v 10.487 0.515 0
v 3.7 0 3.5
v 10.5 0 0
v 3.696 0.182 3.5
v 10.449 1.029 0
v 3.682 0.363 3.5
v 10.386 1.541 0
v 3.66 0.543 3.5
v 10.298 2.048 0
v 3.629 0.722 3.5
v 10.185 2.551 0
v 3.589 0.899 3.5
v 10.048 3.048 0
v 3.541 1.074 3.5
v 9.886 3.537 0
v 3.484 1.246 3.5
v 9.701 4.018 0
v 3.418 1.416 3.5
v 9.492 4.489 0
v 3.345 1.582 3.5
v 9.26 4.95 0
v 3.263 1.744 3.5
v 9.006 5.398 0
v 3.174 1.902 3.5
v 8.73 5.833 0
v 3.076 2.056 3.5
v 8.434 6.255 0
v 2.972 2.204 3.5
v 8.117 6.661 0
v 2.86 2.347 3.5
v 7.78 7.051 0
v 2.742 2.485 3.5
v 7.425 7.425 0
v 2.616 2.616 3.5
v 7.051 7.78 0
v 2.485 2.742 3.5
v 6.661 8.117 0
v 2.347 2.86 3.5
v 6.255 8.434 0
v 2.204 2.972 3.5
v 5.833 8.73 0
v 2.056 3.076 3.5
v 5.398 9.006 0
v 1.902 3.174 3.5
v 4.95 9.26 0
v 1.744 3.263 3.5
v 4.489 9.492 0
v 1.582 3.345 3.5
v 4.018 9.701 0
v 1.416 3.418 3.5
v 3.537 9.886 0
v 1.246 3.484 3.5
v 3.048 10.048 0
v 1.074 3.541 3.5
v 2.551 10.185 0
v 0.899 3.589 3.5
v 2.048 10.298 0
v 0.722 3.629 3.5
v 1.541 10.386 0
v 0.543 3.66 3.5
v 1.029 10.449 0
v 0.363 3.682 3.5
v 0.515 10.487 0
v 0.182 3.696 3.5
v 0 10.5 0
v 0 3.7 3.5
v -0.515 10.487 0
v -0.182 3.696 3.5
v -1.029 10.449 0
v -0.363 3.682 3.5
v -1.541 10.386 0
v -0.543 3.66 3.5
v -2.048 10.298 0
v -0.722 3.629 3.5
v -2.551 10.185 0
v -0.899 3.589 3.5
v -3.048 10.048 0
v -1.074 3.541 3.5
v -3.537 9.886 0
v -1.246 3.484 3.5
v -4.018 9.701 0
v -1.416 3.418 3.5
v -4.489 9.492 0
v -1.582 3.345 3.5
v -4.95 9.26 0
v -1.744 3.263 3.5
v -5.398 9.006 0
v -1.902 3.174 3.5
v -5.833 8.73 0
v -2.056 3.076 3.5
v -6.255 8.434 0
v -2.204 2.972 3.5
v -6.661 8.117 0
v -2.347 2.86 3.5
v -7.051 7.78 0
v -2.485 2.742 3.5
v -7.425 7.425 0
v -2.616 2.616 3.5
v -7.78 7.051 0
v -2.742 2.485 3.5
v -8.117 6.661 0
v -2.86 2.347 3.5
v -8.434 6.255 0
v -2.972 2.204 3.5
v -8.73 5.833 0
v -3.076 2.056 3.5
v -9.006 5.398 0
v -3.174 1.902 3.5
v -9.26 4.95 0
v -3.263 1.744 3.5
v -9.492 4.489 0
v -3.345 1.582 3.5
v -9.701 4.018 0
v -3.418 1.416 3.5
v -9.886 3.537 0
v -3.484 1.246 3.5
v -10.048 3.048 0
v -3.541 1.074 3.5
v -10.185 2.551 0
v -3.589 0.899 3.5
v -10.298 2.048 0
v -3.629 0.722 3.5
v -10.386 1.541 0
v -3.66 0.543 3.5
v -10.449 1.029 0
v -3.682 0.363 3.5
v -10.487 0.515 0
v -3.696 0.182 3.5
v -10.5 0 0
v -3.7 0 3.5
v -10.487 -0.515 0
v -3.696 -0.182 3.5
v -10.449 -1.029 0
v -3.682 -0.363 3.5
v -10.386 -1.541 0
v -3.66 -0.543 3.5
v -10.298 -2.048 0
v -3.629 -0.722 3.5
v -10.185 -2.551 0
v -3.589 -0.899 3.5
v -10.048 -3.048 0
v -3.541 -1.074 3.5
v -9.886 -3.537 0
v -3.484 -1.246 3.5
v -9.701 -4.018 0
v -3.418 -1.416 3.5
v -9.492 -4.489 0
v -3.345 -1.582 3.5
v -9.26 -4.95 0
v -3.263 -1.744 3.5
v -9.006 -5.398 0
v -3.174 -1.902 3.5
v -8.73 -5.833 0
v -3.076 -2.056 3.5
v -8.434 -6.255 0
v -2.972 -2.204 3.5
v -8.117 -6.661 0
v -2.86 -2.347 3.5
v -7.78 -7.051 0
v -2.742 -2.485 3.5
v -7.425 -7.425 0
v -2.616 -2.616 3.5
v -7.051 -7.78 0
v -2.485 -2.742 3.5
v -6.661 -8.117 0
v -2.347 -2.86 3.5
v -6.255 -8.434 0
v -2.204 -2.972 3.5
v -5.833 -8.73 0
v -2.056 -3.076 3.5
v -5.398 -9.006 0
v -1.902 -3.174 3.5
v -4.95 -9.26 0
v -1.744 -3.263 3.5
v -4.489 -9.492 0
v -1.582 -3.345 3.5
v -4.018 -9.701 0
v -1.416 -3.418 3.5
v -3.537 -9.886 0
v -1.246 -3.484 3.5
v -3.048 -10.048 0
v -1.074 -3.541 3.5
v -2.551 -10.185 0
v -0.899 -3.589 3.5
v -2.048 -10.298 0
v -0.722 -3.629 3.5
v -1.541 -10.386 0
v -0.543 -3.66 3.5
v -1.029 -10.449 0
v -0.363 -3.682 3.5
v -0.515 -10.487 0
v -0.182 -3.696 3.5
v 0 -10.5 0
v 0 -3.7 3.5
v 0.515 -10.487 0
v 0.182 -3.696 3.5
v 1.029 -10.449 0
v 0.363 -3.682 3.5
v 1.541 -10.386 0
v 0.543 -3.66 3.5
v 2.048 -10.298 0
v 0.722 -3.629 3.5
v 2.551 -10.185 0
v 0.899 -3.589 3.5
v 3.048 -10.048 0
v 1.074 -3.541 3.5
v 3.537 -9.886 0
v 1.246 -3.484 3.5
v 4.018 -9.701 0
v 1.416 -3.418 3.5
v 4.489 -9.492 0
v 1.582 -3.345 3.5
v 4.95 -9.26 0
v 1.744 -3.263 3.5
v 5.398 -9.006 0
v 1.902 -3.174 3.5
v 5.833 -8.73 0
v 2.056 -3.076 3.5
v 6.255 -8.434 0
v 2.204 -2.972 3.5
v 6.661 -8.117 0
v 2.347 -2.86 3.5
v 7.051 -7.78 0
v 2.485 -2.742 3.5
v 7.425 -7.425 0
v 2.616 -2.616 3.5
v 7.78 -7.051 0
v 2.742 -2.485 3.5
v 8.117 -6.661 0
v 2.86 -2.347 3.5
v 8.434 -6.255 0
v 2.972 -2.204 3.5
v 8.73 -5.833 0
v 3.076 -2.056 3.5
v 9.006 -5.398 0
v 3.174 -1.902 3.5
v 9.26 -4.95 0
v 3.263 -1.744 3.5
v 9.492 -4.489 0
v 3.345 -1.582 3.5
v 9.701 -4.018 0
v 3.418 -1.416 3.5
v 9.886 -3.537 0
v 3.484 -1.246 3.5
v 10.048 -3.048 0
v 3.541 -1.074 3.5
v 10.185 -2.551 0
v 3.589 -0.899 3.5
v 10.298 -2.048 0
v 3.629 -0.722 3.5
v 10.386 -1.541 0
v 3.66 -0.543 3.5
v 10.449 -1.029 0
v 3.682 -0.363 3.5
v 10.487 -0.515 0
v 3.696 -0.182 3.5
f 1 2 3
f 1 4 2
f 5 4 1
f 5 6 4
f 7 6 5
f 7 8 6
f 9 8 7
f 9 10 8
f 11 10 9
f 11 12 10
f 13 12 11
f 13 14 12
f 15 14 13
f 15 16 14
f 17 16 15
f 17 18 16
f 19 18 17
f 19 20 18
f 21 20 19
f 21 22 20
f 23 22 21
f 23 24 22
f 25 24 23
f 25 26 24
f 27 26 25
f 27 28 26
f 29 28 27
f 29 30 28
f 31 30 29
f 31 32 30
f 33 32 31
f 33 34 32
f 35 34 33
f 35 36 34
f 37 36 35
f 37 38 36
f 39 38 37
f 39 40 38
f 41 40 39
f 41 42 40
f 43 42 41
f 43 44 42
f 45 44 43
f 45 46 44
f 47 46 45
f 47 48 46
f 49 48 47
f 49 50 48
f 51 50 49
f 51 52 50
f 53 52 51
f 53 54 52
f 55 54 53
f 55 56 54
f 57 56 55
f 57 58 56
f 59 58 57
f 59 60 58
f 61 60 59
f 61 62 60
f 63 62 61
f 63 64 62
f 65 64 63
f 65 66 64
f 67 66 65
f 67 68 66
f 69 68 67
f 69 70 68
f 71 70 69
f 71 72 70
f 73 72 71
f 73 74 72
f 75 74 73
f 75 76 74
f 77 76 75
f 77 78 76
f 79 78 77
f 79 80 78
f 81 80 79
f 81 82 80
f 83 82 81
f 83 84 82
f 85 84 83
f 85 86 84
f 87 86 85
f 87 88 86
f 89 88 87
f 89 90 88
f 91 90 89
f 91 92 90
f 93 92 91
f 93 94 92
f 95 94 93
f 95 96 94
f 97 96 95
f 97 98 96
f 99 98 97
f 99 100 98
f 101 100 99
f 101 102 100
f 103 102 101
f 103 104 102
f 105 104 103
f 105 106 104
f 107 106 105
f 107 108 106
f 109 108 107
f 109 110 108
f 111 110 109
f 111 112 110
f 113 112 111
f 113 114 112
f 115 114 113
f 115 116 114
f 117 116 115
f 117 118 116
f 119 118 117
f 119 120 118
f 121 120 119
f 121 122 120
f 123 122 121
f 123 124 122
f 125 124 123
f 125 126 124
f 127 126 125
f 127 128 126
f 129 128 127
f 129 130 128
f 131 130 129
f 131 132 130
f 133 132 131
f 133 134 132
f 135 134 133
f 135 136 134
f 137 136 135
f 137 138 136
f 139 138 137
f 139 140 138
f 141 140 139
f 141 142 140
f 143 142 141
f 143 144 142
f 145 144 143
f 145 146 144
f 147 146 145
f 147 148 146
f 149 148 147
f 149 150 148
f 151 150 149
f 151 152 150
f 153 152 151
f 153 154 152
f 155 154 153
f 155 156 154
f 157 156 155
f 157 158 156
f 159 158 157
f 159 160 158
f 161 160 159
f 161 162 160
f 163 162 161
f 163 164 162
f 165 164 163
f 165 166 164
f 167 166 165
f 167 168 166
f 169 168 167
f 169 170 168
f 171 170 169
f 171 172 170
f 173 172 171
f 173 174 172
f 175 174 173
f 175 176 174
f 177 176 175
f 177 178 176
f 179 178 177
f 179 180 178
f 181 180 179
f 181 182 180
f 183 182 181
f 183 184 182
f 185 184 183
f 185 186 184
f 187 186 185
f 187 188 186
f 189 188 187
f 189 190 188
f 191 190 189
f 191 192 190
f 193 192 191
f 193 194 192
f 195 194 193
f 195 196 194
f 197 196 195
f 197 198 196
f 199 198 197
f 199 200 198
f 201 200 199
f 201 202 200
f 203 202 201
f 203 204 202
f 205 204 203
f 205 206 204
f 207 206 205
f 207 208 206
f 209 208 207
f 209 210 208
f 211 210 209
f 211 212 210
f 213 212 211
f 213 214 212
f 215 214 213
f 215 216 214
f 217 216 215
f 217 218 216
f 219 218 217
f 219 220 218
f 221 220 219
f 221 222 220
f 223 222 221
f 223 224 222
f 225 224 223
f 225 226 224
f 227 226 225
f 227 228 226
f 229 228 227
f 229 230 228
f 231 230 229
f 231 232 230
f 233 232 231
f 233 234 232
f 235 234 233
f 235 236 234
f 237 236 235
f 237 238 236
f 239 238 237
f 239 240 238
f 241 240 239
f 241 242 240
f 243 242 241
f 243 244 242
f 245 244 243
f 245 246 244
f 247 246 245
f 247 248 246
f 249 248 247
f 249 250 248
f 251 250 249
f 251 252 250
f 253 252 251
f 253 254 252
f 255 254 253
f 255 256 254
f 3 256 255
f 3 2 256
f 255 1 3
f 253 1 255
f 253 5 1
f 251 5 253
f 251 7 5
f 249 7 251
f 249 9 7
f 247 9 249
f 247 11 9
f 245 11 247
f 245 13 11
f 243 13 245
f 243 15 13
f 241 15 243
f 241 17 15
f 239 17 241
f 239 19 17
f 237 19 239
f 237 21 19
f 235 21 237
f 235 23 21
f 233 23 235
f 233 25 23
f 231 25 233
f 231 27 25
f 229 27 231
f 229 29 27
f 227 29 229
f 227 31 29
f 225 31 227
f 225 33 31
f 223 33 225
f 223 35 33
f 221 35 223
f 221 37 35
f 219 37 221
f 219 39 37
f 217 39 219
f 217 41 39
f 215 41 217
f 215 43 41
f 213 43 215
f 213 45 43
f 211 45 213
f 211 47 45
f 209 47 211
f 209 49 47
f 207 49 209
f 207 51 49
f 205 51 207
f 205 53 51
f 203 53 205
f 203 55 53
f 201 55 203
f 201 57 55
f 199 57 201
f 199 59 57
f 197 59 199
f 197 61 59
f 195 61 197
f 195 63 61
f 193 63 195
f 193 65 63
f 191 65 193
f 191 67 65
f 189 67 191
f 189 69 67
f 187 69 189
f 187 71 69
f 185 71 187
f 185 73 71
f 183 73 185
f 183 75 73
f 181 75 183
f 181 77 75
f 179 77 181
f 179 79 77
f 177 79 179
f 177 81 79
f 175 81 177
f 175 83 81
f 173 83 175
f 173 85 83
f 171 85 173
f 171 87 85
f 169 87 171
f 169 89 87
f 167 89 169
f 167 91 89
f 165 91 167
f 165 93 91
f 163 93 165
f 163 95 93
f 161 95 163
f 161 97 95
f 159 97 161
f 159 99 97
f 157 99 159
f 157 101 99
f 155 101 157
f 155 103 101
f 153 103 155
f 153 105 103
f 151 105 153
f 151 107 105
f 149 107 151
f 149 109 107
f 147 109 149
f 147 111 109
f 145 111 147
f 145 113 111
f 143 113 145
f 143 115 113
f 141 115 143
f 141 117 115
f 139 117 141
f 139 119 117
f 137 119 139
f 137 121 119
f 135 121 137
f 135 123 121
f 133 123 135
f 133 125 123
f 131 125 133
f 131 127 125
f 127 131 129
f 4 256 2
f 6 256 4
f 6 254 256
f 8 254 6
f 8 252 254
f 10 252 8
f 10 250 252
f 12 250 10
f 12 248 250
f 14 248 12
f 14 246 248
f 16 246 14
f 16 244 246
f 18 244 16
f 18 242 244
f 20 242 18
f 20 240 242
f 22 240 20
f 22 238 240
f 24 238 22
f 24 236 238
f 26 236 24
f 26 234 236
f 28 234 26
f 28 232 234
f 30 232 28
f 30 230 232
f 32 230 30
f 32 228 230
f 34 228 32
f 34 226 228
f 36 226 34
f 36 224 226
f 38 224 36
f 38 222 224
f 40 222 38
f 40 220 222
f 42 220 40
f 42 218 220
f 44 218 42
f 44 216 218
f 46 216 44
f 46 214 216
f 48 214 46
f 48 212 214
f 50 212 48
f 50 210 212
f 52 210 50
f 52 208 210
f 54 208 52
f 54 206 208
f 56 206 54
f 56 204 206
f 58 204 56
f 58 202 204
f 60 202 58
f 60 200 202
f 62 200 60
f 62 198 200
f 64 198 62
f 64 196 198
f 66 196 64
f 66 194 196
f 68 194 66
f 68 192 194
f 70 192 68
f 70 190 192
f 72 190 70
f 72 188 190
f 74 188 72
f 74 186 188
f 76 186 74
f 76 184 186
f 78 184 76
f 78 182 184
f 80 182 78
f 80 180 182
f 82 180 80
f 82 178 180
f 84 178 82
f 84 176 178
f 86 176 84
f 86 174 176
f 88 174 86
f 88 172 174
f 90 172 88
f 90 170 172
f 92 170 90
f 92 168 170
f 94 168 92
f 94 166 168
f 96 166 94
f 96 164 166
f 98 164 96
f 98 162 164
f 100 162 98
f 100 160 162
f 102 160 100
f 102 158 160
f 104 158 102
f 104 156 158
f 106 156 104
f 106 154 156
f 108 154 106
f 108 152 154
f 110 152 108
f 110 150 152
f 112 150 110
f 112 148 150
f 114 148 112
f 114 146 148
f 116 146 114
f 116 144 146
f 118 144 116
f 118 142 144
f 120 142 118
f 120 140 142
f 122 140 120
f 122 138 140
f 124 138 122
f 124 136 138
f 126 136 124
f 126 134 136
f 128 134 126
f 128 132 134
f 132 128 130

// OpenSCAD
$fn = 128;

r1 = 10.5;
r2 = 3.7;
h  = 3.5;

cylinder(h = h, r1 = r1, r2 = r2);
